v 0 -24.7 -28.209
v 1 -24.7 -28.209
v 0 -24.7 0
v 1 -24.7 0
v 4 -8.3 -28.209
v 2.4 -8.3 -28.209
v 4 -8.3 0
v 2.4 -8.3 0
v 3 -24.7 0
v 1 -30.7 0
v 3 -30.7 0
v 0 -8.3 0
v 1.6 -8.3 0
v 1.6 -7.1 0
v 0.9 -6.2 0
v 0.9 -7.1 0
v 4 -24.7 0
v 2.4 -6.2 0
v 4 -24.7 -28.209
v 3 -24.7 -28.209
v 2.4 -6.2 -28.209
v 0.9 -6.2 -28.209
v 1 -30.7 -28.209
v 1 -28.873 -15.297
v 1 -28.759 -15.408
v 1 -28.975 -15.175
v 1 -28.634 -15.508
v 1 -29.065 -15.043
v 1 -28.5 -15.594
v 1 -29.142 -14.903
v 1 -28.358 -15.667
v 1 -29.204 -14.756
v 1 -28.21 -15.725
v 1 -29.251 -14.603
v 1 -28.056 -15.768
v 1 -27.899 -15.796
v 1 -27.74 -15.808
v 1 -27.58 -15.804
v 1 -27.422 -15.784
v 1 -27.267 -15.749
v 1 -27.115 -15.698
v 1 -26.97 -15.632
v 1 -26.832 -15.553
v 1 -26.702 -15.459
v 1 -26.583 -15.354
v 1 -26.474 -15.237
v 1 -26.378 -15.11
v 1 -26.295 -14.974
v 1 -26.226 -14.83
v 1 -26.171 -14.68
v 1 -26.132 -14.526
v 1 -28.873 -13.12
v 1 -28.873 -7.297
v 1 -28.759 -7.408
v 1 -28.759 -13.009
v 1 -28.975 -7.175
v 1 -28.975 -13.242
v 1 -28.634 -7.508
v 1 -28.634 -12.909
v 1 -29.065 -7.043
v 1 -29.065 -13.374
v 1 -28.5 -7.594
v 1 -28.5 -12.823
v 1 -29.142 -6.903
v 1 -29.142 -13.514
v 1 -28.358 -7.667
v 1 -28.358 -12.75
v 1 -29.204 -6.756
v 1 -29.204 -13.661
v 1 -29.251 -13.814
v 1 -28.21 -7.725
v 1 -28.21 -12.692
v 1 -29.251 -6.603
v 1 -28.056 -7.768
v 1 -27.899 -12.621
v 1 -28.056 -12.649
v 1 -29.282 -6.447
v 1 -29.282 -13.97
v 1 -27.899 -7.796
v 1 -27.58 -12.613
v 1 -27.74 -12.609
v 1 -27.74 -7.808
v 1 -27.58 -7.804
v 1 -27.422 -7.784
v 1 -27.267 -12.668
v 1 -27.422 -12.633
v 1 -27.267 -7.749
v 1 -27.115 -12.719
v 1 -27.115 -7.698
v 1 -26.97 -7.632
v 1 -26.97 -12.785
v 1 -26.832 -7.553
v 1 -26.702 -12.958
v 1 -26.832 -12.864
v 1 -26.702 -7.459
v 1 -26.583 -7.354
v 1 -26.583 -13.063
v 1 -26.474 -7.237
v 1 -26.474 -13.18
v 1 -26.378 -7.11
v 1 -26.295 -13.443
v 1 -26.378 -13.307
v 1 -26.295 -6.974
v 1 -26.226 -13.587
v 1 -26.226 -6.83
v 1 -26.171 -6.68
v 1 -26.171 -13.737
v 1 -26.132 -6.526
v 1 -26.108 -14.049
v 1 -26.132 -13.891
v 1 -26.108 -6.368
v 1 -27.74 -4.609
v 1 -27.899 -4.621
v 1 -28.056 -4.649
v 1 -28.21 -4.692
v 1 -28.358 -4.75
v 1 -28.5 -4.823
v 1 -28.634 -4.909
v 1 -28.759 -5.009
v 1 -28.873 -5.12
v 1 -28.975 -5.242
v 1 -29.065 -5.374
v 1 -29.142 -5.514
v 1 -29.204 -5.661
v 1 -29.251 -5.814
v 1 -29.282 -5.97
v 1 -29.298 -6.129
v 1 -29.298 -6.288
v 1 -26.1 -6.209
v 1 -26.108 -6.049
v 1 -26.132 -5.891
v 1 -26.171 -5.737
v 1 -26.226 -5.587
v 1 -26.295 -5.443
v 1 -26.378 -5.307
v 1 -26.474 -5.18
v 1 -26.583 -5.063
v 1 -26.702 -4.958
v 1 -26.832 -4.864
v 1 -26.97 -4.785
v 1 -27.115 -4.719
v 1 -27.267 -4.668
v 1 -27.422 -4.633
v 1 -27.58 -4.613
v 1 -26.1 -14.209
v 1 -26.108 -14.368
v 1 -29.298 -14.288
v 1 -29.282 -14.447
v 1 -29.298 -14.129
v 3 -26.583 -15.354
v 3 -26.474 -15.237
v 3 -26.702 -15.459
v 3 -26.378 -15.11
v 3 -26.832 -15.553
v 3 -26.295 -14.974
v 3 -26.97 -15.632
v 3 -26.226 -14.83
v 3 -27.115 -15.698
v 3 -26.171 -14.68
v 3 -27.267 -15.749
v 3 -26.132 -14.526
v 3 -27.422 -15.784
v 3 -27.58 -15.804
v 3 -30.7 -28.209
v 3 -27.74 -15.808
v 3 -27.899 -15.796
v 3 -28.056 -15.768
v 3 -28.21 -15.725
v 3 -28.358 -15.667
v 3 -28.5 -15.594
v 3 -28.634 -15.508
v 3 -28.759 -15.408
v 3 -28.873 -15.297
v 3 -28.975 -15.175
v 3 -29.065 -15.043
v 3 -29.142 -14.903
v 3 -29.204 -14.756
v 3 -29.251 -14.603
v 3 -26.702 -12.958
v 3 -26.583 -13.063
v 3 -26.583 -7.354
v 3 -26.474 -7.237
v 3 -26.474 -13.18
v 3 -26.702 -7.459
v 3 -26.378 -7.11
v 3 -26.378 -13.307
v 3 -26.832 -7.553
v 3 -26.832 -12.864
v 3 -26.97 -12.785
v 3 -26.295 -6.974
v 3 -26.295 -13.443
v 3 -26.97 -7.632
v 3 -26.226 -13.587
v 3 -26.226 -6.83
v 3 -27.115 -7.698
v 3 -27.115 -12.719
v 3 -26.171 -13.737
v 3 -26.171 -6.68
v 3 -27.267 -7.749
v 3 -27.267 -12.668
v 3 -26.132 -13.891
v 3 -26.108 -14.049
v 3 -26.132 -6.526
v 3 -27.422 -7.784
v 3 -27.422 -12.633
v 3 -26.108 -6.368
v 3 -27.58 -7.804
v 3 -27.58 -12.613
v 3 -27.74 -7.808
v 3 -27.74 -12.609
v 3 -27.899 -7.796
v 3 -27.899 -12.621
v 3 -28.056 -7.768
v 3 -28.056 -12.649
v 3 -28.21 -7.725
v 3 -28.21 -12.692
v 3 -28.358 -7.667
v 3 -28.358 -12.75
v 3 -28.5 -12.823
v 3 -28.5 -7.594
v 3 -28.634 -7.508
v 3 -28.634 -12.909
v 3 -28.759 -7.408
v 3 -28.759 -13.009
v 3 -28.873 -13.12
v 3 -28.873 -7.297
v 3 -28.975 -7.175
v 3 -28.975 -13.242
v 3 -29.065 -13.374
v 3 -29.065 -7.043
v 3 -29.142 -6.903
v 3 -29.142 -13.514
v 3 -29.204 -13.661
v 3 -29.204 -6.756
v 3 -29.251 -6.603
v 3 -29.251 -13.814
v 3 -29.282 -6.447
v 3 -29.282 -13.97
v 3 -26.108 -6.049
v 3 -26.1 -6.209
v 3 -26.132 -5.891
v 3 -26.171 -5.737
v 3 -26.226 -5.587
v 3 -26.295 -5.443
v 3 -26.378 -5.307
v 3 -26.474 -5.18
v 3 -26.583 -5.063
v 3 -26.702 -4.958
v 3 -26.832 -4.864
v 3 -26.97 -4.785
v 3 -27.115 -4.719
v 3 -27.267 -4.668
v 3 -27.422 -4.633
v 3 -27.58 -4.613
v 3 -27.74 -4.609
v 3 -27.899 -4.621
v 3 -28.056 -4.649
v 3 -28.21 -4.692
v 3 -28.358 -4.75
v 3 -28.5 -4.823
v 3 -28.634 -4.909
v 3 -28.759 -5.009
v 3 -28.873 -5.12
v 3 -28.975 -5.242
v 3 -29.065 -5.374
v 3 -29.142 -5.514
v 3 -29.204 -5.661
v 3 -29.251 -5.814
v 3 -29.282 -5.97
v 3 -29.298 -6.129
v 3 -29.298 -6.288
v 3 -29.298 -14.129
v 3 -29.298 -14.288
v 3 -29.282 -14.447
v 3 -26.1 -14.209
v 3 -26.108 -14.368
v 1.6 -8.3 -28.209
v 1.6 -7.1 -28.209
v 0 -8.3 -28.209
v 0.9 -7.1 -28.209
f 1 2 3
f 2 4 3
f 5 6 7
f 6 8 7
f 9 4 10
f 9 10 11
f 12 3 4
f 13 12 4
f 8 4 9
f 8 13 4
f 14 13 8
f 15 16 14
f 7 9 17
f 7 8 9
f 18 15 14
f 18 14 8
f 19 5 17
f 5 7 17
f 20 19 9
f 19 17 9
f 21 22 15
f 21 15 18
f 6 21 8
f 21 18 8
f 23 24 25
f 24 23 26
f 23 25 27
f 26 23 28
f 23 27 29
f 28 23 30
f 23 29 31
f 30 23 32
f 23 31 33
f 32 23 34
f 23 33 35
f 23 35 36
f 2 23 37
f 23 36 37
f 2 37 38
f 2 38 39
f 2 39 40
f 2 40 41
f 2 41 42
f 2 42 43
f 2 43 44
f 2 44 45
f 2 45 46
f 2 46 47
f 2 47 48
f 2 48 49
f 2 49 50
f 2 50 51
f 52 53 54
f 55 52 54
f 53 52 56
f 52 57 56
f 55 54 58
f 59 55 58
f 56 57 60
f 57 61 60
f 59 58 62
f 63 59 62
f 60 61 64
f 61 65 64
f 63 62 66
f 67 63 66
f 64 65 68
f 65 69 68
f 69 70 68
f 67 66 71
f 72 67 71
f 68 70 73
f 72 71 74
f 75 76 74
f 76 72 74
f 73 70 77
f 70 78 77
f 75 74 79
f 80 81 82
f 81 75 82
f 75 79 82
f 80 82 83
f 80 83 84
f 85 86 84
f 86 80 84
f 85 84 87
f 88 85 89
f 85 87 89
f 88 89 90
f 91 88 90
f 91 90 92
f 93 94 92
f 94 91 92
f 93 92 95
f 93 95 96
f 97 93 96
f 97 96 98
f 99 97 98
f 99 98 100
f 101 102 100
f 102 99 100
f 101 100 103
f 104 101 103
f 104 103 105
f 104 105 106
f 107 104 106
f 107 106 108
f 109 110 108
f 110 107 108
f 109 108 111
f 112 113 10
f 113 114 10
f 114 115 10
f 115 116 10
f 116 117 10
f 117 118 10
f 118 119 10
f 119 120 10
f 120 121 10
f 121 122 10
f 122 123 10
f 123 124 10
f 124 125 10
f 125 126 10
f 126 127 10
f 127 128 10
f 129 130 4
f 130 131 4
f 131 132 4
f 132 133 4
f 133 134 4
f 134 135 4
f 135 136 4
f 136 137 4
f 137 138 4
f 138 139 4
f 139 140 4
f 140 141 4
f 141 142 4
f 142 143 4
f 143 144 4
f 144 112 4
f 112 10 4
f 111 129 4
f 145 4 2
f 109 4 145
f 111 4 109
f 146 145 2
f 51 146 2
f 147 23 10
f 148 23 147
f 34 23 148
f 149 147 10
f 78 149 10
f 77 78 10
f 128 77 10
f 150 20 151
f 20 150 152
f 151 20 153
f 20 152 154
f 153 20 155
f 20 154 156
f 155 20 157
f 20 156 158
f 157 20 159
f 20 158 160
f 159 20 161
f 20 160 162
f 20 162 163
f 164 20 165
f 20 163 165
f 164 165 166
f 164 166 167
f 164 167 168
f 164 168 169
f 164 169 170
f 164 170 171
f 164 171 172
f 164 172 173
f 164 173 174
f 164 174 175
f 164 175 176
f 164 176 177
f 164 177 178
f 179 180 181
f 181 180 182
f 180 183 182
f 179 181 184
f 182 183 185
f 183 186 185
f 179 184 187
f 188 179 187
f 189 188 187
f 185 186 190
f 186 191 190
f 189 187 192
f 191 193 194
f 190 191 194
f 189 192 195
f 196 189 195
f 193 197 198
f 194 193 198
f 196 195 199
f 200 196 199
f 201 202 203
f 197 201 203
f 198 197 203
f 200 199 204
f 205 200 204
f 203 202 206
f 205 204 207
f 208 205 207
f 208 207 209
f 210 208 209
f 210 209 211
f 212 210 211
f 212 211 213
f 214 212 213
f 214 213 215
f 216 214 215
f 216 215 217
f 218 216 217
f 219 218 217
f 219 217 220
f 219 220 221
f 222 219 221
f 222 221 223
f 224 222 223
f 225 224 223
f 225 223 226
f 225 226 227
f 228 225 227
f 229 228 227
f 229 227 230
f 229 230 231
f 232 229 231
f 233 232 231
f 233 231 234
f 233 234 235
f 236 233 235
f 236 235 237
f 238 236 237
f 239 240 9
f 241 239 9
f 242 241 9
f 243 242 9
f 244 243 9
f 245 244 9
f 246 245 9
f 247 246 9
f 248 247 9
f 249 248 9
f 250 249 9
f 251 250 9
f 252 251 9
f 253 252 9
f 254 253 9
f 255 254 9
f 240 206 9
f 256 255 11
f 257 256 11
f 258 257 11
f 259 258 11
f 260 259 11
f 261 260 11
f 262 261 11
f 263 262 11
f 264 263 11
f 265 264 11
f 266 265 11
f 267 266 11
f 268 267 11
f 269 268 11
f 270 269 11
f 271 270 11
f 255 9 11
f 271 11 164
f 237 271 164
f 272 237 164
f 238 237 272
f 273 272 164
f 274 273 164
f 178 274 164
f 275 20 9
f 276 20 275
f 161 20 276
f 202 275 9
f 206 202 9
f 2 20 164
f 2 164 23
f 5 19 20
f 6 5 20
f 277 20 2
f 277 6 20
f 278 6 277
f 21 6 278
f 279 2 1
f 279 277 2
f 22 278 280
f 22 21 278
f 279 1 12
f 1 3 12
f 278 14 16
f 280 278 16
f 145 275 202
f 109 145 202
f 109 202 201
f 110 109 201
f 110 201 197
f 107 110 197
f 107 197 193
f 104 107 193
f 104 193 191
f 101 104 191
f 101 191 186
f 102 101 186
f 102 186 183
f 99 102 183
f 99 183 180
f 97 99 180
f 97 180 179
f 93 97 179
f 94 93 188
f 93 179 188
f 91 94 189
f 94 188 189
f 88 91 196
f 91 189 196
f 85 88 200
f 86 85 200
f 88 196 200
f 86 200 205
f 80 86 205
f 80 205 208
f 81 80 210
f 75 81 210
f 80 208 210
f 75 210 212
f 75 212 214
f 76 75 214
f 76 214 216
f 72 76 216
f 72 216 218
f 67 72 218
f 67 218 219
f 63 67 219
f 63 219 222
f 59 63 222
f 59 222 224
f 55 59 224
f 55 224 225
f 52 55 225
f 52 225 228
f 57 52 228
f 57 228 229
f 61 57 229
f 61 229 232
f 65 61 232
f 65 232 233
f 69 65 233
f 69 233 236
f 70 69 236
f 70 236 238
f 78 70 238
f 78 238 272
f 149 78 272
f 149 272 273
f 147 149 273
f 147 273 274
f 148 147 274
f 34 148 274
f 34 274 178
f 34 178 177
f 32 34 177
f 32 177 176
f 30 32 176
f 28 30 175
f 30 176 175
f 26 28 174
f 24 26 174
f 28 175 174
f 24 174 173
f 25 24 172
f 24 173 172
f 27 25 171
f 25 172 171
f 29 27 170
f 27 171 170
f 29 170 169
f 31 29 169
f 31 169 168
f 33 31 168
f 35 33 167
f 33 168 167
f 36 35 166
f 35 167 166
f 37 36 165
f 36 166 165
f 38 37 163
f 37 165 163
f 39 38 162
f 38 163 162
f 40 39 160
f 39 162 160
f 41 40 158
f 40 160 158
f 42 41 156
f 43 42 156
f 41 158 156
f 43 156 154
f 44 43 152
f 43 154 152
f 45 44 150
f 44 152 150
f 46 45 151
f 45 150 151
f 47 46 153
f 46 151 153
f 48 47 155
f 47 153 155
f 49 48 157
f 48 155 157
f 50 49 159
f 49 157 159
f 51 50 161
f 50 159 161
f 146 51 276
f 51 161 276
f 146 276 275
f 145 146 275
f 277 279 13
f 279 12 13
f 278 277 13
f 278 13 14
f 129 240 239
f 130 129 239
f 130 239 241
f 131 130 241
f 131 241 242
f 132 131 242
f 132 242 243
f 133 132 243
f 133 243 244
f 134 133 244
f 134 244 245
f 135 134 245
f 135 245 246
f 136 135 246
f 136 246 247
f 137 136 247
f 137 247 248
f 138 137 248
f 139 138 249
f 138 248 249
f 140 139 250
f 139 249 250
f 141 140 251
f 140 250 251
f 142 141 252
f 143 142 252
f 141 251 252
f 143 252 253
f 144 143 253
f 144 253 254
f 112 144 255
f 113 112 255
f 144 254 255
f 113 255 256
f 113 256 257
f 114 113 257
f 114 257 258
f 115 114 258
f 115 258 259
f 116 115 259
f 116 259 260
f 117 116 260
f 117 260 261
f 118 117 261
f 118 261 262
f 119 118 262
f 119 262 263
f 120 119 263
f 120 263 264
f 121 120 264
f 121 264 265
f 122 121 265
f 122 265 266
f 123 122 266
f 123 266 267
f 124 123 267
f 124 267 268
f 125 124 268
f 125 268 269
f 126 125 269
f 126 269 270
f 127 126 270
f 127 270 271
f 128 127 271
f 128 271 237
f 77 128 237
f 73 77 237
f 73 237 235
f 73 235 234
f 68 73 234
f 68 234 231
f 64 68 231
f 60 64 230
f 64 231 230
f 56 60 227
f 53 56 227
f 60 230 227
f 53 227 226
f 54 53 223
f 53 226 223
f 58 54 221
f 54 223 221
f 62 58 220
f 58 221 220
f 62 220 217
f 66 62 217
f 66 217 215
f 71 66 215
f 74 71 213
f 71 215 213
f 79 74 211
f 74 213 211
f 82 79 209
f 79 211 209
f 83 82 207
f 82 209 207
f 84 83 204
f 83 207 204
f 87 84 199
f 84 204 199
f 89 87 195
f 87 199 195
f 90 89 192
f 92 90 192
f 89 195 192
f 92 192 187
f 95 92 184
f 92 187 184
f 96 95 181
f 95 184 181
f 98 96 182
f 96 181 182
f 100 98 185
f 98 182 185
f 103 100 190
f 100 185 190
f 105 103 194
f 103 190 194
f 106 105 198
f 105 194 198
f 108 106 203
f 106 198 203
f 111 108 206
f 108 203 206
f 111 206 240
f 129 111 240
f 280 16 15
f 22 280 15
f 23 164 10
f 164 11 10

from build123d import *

# Parameters (mm, degrees)
SKETCH_1_W          = 0.8
SKETCH_1_H          = 2.1
SKETCH_1_W_2        = 2
SKETCH_1_H_2        = 6
SKETCH_1_W_3        = 0.7
SKETCH_1_H_3        = 0.9
EXTRUDE_1_DEPTH     = 20
SKETCH_3_R          = 1.6
CUT_EXTRUDE_1_DEPTH = 37.762616882
EXTRUDE_2_DEPTH     = 8.208511786


with BuildPart() as part:
    # 草图1 → 凸台-拉伸1 (new body)
    with BuildSketch(Plane.XY):
        with Locations((2, -7.25)):
            Rectangle(SKETCH_1_W, SKETCH_1_H)
        Polygon((4, -8.3), (2.4, -8.3), (1.6, -8.3), (0, -8.3), (0, -24.7), (1, -24.7), (3, -24.7), (4, -24.7), align=None)
        with Locations((2, -27.7)):
            Rectangle(SKETCH_1_W_2, SKETCH_1_H_2)
        with Locations((1.25, -6.65)):
            Rectangle(SKETCH_1_W_3, SKETCH_1_H_3)
    extrude(amount=-EXTRUDE_1_DEPTH)

    # 草图3 → 切除-拉伸1 (cut, through all)
    with BuildSketch(Plane(origin=(3, 0, 0), x_dir=(0, 0, -1), z_dir=(1, 0, 0))):
        with Locations(Location((6.208511786, -27.7, 0), (0, 0, 90))):
            Circle(SKETCH_3_R)
        with Locations(Location((14.208511786, -27.7, 0), (0, 0, 90))):
            Circle(SKETCH_3_R)
    extrude(amount=-CUT_EXTRUDE_1_DEPTH, mode=Mode.SUBTRACT)

    # 草图4 → 凸台-拉伸2 (add)
    with BuildSketch(Plane(origin=(0, 0, -20), x_dir=(-1, 0, 0), z_dir=(0, 0, -1))):
        Polygon((-0.9, -6.2), (-2.4, -6.2), (-2.4, -8.3), (-4, -8.3), (-4, -24.7), (-3, -24.7), (-3, -30.7), (-1, -30.7), (-1, -24.7), (0, -24.7), (0, -8.3), (-1.6, -8.3), (-1.6, -7.1), (-0.9, -7.1), align=None)
    extrude(amount=EXTRUDE_2_DEPTH)


solid = part.part
